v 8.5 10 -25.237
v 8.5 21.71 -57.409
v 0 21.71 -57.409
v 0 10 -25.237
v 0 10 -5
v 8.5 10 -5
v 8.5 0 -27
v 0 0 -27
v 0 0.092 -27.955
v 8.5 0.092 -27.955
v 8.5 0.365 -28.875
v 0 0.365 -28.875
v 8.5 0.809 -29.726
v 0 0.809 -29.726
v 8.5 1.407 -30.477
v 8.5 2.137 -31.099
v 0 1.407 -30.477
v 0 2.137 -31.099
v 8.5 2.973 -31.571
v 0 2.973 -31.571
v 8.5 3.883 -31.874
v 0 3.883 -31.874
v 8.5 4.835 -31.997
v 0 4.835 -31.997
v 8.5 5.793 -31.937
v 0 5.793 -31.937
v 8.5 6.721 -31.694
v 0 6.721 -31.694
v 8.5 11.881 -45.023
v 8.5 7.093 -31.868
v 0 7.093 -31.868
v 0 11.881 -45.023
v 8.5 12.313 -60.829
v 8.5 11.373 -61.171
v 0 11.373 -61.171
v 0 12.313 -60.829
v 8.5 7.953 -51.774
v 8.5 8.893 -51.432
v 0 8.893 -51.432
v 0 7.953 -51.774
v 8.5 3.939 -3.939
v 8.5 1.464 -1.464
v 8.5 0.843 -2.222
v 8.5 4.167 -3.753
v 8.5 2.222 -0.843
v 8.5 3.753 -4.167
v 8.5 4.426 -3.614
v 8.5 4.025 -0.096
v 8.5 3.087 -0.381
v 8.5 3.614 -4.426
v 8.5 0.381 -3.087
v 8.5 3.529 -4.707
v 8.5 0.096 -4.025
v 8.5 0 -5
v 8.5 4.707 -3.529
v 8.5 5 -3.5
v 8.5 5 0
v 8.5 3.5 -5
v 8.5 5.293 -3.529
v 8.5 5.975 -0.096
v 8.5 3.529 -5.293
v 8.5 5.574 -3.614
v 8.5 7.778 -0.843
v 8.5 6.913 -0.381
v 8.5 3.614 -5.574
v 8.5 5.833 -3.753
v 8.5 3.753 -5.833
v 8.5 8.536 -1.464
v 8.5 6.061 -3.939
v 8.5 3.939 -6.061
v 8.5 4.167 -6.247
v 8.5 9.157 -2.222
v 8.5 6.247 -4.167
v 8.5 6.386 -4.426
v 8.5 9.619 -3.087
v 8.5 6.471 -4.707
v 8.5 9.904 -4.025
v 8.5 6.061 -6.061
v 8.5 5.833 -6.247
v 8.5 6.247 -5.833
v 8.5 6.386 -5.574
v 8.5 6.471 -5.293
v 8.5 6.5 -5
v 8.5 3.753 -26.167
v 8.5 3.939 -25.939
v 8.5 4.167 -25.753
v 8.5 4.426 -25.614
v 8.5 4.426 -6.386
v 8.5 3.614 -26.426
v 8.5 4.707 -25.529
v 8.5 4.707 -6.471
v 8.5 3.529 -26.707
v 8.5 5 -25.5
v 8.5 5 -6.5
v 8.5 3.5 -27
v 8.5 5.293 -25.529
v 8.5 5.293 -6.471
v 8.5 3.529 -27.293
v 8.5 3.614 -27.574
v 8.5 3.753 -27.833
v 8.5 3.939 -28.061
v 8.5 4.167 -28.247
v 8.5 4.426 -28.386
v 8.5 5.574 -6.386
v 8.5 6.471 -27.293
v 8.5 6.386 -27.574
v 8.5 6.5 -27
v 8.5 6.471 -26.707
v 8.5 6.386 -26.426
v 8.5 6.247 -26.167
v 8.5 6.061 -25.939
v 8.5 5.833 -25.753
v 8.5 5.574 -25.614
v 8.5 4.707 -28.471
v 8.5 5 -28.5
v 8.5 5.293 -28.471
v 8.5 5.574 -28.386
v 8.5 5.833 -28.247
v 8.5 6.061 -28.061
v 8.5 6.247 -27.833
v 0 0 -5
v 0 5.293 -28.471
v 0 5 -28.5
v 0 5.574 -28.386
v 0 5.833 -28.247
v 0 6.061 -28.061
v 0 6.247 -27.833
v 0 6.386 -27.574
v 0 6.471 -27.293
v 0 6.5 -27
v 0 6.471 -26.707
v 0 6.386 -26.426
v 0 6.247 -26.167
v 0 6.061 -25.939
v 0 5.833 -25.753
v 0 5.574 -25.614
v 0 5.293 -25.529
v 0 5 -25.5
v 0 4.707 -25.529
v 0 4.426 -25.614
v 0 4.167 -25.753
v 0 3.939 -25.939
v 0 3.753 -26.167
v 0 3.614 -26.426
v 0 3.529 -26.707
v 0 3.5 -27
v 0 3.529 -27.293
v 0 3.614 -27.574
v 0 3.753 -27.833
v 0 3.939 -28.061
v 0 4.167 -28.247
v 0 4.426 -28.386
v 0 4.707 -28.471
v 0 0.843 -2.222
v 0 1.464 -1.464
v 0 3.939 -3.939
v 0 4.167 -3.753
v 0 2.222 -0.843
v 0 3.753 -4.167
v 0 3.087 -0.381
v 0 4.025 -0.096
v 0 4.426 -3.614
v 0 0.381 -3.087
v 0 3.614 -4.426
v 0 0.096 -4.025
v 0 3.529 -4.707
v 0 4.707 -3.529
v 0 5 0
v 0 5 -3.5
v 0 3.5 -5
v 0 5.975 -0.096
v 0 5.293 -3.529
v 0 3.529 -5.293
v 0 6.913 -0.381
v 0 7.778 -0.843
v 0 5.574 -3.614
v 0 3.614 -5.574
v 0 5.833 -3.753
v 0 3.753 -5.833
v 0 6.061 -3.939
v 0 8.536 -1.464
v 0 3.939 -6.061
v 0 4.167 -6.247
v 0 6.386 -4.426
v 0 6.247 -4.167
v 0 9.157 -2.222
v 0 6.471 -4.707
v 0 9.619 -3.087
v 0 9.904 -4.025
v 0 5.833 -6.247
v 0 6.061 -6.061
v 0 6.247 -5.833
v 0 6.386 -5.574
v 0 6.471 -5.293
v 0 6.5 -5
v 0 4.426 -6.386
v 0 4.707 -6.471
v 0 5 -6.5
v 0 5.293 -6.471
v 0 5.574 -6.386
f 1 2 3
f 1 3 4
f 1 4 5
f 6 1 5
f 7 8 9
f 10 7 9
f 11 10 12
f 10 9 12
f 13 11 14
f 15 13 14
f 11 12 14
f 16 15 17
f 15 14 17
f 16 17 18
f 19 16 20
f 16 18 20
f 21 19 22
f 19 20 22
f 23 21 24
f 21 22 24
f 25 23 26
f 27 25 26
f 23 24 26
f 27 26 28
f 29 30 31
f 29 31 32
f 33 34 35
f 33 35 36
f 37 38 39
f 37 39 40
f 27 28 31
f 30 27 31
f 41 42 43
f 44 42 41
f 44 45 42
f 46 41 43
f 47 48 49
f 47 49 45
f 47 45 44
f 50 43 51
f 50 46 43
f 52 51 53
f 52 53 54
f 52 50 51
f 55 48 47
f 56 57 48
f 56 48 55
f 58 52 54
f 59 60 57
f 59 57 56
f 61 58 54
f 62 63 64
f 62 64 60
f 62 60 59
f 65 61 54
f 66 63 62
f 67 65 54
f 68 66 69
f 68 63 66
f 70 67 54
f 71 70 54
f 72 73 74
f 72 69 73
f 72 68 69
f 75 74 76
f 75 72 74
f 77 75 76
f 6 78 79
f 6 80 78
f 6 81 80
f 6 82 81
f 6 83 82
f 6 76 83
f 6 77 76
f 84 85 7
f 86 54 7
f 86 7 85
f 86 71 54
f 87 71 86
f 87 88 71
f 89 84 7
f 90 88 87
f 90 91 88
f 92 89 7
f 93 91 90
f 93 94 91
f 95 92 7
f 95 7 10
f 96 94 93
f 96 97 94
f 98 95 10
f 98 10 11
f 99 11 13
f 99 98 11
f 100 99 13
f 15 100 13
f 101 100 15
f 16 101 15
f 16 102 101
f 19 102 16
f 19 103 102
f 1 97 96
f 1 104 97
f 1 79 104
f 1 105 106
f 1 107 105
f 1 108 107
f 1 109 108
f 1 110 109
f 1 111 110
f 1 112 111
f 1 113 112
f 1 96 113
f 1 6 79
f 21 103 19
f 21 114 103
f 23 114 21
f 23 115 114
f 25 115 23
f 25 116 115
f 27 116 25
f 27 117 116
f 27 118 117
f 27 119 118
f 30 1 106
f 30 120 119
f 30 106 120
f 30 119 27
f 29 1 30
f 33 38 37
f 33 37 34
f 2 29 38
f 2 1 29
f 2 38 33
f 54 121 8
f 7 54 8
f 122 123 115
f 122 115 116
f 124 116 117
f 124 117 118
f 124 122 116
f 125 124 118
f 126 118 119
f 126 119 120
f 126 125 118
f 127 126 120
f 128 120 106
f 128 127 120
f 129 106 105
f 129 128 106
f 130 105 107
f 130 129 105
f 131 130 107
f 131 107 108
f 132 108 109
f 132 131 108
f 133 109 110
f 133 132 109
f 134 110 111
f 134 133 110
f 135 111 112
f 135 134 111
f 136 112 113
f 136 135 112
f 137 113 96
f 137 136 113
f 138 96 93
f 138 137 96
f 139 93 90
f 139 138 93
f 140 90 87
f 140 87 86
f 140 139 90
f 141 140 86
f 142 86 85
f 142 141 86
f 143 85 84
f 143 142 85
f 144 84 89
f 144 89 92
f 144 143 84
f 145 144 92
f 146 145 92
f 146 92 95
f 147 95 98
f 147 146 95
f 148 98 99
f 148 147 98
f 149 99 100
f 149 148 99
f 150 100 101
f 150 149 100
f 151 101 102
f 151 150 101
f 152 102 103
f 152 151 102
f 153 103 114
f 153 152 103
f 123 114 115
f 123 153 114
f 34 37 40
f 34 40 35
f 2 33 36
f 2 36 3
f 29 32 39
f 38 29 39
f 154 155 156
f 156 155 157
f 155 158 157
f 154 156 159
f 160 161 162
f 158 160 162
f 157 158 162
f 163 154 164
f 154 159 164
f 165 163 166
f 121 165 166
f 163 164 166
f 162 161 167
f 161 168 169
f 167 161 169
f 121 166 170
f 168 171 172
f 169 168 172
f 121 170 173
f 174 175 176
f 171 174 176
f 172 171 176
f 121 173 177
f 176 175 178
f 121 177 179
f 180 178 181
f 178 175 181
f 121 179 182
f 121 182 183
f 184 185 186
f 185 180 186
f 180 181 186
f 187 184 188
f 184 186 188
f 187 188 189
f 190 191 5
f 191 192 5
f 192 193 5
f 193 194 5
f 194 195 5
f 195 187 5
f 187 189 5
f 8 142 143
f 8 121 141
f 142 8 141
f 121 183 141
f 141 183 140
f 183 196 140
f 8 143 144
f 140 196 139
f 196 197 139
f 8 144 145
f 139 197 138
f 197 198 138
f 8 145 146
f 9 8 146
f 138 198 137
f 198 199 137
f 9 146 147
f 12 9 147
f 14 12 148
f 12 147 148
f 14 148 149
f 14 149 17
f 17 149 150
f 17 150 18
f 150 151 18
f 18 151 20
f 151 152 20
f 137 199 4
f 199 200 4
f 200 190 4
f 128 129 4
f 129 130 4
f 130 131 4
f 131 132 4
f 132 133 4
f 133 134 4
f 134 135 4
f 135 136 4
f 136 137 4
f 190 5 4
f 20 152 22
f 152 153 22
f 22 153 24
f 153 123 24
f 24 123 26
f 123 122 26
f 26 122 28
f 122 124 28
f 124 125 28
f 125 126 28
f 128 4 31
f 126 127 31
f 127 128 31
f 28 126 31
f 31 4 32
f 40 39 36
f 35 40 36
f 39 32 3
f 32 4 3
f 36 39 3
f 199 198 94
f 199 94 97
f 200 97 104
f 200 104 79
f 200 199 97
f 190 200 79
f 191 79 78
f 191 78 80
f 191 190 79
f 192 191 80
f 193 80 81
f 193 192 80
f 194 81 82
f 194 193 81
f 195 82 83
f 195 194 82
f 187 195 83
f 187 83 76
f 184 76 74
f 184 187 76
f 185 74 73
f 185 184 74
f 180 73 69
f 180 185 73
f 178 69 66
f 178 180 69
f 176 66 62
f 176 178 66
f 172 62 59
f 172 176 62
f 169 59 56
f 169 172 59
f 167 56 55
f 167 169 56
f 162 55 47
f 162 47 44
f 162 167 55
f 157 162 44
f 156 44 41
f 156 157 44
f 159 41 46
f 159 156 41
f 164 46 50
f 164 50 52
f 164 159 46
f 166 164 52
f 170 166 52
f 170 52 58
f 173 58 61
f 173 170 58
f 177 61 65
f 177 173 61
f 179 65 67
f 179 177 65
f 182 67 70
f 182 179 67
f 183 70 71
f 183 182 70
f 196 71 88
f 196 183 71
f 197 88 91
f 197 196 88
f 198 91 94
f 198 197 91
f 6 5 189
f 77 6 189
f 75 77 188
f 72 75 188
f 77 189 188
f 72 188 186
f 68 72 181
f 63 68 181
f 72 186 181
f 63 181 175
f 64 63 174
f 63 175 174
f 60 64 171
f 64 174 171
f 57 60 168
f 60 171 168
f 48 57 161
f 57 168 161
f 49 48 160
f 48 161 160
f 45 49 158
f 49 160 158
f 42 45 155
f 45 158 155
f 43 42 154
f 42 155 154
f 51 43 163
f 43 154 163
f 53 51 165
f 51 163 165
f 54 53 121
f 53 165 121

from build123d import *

# Parameters (mm, degrees)
SKETCH1_R           = 1.5
BOSS_EXTRUDE1_DEPTH = 8.5
BOSS_EXTRUDE2_DEPTH = 8.5


with BuildPart() as part:
    # Sketch1 → Boss-Extrude1 (new body)
    with BuildSketch(Plane(origin=(0, 0, 0), x_dir=(0, 0, -1), z_dir=(1, 0, 0))):
        with BuildLine():
            Line((27, 10), (5, 10))
            ThreePointArc((5, 10), (0, 5), (5, 0))
            Line((5, 0), (27, 0))
            ThreePointArc((27, 0), (32, 5), (27, 10))
        make_face()
        with Locations((5, 5)):
            Circle(SKETCH1_R, mode=Mode.SUBTRACT)
        with Locations((27, 5)):
            Circle(SKETCH1_R, mode=Mode.SUBTRACT)
    extrude(amount=BOSS_EXTRUDE1_DEPTH)

    # Sketch2 → Boss-Extrude2 (add)
    with BuildSketch(Plane(origin=(8.5, 0, 0), x_dir=(0, 0, -1), z_dir=(1, 0, 0))):
        with BuildLine():
            ThreePointArc((27, 10), (29.863119288, 9.099091112), (31.69447473, 6.721019177))
            Line((31.69447473, 6.721019177), (31.867747629, 7.092604107))
            Line((31.867747629, 7.092604107), (45.02344432, 11.880886114))
            Line((45.02344432, 11.880886114), (51.43200814, 8.892523726))
            Line((51.43200814, 8.892523726), (60.828934348, 12.31272516))
            Line((60.828934348, 12.31272516), (57.408732915, 21.709651368))
            Line((57.408732915, 21.709651368), (25.236730193, 10))
            Line((25.236730193, 10), (27, 10))
        make_face()
        Polygon((60.828934348, 12.31272516), (51.43200814, 8.892523726), (51.774028284, 7.952831106), (61.170954492, 11.373032539), align=None)
    extrude(amount=-BOSS_EXTRUDE2_DEPTH)


solid = part.part
